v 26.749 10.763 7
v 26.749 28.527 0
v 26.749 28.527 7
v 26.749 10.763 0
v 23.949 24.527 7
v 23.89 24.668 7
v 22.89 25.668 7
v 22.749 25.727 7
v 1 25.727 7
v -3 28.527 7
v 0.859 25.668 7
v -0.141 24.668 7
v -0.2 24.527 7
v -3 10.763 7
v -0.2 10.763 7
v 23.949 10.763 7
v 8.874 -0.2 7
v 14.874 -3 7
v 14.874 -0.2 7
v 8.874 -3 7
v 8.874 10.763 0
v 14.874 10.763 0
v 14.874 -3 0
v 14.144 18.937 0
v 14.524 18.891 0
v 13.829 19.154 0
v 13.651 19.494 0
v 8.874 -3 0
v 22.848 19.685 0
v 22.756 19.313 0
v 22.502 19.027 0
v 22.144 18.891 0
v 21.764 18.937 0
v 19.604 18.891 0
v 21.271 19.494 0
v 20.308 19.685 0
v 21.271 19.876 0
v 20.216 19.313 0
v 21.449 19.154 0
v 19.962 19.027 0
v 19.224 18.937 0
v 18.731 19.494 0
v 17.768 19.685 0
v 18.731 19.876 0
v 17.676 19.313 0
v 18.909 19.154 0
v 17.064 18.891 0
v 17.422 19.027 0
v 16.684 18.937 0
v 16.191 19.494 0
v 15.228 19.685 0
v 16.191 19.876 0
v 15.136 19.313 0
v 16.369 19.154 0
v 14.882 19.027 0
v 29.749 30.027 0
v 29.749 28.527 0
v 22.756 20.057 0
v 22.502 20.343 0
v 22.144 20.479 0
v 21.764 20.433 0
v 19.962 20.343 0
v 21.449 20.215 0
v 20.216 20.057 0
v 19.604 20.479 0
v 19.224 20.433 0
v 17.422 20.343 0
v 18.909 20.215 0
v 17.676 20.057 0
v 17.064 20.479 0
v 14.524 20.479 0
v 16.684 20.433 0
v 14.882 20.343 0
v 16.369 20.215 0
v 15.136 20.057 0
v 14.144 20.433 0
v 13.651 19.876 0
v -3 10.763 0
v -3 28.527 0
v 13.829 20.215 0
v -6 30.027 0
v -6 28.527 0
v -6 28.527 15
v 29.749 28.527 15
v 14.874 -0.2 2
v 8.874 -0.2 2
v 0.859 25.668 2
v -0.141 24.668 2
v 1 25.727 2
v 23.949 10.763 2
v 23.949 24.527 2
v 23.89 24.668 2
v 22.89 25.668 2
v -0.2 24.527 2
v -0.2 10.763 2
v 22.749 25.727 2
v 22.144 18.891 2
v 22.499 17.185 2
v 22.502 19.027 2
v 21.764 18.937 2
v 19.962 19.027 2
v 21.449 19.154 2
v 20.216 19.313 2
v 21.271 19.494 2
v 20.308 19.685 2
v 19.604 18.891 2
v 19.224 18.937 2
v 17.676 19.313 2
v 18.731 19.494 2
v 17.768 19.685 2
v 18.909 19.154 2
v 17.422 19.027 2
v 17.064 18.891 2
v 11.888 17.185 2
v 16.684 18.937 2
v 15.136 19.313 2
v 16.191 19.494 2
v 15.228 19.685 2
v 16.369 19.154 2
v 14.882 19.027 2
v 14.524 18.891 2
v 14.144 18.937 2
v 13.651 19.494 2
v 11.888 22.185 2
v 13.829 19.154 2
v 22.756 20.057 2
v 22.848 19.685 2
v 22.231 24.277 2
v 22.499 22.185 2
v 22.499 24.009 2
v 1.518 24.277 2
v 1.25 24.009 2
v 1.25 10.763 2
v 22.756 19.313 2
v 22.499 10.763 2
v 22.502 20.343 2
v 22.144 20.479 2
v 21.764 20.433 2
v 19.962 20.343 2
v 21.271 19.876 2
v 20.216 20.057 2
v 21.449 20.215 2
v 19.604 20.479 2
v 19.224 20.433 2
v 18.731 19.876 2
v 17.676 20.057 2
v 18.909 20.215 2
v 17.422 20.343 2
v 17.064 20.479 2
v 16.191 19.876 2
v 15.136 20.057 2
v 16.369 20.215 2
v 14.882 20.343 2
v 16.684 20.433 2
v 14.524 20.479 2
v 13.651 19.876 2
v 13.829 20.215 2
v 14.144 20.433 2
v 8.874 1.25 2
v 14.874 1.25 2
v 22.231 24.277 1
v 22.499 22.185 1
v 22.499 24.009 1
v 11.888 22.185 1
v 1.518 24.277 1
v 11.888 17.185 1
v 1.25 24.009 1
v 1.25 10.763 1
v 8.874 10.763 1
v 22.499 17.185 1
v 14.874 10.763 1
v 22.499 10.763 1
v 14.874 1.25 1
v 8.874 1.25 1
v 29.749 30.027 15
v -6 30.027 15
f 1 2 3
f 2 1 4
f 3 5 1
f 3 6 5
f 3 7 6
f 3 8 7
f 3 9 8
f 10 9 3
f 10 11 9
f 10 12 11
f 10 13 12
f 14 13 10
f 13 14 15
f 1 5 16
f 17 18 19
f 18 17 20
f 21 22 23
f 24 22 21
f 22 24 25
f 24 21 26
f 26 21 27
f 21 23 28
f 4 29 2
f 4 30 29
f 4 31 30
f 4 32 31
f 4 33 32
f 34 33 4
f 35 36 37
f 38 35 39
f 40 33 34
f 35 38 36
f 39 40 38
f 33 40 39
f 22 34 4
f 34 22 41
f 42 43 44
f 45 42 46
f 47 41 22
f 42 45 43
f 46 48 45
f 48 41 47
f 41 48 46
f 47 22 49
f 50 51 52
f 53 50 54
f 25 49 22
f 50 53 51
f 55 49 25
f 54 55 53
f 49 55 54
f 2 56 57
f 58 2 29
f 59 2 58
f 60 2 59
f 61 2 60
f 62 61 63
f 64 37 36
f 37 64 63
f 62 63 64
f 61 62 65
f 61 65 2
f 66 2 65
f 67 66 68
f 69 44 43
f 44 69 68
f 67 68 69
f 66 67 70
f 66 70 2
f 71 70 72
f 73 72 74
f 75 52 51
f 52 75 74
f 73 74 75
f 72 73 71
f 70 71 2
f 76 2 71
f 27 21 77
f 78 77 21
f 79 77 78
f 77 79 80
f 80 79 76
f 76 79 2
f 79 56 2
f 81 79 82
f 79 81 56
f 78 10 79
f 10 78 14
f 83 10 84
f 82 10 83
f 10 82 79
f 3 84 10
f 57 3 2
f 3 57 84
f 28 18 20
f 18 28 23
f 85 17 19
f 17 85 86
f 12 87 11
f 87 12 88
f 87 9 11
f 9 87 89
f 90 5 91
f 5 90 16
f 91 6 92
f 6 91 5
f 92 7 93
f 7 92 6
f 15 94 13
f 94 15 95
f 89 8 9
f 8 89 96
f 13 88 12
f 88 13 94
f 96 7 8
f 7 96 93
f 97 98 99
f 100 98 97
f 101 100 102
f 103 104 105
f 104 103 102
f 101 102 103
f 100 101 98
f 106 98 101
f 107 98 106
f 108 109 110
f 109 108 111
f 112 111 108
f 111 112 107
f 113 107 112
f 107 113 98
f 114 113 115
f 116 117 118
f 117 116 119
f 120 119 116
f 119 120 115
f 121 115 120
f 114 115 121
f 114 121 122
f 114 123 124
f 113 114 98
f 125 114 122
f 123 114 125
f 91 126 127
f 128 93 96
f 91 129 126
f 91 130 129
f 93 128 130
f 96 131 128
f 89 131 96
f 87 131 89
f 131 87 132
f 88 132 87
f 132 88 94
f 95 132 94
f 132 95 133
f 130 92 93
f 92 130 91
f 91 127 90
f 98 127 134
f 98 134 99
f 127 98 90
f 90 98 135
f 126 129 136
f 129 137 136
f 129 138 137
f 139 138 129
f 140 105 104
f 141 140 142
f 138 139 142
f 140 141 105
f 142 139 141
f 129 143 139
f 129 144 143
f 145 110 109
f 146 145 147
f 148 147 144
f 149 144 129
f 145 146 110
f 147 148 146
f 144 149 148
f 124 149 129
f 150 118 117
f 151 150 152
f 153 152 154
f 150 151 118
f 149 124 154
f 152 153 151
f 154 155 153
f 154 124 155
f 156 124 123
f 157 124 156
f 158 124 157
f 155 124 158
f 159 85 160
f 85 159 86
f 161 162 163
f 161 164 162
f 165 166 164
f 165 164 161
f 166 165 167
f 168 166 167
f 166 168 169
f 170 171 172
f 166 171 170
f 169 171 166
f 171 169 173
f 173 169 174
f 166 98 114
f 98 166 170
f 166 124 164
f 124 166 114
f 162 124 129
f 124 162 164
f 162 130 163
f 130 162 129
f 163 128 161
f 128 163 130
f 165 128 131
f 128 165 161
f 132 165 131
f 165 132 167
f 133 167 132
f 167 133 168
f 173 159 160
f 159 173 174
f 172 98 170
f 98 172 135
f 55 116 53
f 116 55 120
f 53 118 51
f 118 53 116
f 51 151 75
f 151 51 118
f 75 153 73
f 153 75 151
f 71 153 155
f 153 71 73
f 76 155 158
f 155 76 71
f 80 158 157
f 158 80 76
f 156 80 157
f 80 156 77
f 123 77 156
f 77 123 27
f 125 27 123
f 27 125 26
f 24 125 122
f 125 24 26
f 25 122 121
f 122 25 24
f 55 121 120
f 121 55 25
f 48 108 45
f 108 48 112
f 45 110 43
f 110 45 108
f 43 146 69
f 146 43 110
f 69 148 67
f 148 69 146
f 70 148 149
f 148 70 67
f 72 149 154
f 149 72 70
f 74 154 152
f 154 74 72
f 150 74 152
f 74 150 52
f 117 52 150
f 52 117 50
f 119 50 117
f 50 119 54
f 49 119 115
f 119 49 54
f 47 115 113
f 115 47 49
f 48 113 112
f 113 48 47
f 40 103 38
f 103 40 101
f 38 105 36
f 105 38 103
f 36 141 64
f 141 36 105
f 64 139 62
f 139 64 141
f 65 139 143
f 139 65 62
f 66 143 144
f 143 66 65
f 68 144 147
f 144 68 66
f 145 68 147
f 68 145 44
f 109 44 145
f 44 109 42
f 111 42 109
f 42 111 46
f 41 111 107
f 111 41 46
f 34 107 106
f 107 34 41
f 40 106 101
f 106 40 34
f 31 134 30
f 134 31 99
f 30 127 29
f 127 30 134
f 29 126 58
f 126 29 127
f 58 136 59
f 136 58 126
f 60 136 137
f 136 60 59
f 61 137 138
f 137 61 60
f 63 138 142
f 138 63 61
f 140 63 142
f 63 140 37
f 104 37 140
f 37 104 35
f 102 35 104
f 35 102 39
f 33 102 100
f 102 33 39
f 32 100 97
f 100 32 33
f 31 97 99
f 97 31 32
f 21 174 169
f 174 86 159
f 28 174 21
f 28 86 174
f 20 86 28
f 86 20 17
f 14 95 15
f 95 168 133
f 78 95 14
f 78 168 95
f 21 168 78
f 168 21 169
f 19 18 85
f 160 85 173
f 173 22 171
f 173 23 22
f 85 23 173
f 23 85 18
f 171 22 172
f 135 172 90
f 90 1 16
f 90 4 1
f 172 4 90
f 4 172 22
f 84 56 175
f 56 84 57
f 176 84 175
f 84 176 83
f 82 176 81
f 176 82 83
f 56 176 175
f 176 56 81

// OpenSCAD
$fs = 0.4; // millimetres

board_width = (139.827 - 116.078);
board_height = (91.948 - 66.421);

pogo_offset_x = (130.506 - 116.078); // Left-hand pin
pogo_offset_y = (72.263  - 66.421); // Offset from top of board.

module bevelledsquare(size=[1,1], radius=0.1) {
    // 8-sided polygon
    polygon(points=[
        // Left
        [0, radius ],
        [0, size[1] - radius ],
        // Top
        [radius, size[1]],
        [size[0] - radius, size[1]],
        // Right
        [size[0], size[1] - radius],
        [size[0], radius],
        // Bot
        [size[0] -radius, 0],
        [radius, 0]
        ]);
}

module pogo_pins() {
    for (n = [0:3]) {
        offset = n * 2.54;
        translate([pogo_offset_x + offset, board_height - pogo_offset_y])
            circle(0.8);
    }
}

module pogo_pins_surround() {
    w = 6 * 2.54;
    h = 5.0;
    translate([pogo_offset_x + (2 * 2.54), board_height - pogo_offset_y])
        square([w,h], center=true);
}

module board_outline() {
    union() {
        bevelledsquare([board_width, board_height], 1.0);
        
        // Un-bevel the bottom
        square([board_width, board_height - 10.0]);
    }
}

module main() {
    difference() {
        translate([-3, -3, 0])
            cube([board_width + 6.0, board_height + 6.0, 7.0]);
        
        // Cut the board out of a cube
        // Give a small offset, to allow the board a little wiggle room
        translate([0,0,2])
            linear_extrude(height=10.0)
                offset(r=0.2) board_outline();
        // Cut out the inner
        translate([0,0,1])
            linear_extrude(height=10.0, convexity=3)
                difference() {
                    offset(r=-1.25) board_outline();
                    pogo_pins_surround();
                }
        
        // Drill through the pogo pins
        linear_extrude(height=20.0)
            pogo_pins();
        // Cut off the corners 
        translate([-10, -10, 0]) 
            cube([10+(board_width/2)-3, 10+(board_height/2)-2, 20]);
        translate([(board_width/2) + 3, -10, 0]) 
            cube([10+(board_width/2)-2, 10+(board_height/2)-2, 20]);
    }
    // A piece up the top to allow it to stand upright on the bench
    translate([-6,board_height + 3.0, 0])
        cube([board_width + 12.0, 1.5, 15.0]);
}

main();
